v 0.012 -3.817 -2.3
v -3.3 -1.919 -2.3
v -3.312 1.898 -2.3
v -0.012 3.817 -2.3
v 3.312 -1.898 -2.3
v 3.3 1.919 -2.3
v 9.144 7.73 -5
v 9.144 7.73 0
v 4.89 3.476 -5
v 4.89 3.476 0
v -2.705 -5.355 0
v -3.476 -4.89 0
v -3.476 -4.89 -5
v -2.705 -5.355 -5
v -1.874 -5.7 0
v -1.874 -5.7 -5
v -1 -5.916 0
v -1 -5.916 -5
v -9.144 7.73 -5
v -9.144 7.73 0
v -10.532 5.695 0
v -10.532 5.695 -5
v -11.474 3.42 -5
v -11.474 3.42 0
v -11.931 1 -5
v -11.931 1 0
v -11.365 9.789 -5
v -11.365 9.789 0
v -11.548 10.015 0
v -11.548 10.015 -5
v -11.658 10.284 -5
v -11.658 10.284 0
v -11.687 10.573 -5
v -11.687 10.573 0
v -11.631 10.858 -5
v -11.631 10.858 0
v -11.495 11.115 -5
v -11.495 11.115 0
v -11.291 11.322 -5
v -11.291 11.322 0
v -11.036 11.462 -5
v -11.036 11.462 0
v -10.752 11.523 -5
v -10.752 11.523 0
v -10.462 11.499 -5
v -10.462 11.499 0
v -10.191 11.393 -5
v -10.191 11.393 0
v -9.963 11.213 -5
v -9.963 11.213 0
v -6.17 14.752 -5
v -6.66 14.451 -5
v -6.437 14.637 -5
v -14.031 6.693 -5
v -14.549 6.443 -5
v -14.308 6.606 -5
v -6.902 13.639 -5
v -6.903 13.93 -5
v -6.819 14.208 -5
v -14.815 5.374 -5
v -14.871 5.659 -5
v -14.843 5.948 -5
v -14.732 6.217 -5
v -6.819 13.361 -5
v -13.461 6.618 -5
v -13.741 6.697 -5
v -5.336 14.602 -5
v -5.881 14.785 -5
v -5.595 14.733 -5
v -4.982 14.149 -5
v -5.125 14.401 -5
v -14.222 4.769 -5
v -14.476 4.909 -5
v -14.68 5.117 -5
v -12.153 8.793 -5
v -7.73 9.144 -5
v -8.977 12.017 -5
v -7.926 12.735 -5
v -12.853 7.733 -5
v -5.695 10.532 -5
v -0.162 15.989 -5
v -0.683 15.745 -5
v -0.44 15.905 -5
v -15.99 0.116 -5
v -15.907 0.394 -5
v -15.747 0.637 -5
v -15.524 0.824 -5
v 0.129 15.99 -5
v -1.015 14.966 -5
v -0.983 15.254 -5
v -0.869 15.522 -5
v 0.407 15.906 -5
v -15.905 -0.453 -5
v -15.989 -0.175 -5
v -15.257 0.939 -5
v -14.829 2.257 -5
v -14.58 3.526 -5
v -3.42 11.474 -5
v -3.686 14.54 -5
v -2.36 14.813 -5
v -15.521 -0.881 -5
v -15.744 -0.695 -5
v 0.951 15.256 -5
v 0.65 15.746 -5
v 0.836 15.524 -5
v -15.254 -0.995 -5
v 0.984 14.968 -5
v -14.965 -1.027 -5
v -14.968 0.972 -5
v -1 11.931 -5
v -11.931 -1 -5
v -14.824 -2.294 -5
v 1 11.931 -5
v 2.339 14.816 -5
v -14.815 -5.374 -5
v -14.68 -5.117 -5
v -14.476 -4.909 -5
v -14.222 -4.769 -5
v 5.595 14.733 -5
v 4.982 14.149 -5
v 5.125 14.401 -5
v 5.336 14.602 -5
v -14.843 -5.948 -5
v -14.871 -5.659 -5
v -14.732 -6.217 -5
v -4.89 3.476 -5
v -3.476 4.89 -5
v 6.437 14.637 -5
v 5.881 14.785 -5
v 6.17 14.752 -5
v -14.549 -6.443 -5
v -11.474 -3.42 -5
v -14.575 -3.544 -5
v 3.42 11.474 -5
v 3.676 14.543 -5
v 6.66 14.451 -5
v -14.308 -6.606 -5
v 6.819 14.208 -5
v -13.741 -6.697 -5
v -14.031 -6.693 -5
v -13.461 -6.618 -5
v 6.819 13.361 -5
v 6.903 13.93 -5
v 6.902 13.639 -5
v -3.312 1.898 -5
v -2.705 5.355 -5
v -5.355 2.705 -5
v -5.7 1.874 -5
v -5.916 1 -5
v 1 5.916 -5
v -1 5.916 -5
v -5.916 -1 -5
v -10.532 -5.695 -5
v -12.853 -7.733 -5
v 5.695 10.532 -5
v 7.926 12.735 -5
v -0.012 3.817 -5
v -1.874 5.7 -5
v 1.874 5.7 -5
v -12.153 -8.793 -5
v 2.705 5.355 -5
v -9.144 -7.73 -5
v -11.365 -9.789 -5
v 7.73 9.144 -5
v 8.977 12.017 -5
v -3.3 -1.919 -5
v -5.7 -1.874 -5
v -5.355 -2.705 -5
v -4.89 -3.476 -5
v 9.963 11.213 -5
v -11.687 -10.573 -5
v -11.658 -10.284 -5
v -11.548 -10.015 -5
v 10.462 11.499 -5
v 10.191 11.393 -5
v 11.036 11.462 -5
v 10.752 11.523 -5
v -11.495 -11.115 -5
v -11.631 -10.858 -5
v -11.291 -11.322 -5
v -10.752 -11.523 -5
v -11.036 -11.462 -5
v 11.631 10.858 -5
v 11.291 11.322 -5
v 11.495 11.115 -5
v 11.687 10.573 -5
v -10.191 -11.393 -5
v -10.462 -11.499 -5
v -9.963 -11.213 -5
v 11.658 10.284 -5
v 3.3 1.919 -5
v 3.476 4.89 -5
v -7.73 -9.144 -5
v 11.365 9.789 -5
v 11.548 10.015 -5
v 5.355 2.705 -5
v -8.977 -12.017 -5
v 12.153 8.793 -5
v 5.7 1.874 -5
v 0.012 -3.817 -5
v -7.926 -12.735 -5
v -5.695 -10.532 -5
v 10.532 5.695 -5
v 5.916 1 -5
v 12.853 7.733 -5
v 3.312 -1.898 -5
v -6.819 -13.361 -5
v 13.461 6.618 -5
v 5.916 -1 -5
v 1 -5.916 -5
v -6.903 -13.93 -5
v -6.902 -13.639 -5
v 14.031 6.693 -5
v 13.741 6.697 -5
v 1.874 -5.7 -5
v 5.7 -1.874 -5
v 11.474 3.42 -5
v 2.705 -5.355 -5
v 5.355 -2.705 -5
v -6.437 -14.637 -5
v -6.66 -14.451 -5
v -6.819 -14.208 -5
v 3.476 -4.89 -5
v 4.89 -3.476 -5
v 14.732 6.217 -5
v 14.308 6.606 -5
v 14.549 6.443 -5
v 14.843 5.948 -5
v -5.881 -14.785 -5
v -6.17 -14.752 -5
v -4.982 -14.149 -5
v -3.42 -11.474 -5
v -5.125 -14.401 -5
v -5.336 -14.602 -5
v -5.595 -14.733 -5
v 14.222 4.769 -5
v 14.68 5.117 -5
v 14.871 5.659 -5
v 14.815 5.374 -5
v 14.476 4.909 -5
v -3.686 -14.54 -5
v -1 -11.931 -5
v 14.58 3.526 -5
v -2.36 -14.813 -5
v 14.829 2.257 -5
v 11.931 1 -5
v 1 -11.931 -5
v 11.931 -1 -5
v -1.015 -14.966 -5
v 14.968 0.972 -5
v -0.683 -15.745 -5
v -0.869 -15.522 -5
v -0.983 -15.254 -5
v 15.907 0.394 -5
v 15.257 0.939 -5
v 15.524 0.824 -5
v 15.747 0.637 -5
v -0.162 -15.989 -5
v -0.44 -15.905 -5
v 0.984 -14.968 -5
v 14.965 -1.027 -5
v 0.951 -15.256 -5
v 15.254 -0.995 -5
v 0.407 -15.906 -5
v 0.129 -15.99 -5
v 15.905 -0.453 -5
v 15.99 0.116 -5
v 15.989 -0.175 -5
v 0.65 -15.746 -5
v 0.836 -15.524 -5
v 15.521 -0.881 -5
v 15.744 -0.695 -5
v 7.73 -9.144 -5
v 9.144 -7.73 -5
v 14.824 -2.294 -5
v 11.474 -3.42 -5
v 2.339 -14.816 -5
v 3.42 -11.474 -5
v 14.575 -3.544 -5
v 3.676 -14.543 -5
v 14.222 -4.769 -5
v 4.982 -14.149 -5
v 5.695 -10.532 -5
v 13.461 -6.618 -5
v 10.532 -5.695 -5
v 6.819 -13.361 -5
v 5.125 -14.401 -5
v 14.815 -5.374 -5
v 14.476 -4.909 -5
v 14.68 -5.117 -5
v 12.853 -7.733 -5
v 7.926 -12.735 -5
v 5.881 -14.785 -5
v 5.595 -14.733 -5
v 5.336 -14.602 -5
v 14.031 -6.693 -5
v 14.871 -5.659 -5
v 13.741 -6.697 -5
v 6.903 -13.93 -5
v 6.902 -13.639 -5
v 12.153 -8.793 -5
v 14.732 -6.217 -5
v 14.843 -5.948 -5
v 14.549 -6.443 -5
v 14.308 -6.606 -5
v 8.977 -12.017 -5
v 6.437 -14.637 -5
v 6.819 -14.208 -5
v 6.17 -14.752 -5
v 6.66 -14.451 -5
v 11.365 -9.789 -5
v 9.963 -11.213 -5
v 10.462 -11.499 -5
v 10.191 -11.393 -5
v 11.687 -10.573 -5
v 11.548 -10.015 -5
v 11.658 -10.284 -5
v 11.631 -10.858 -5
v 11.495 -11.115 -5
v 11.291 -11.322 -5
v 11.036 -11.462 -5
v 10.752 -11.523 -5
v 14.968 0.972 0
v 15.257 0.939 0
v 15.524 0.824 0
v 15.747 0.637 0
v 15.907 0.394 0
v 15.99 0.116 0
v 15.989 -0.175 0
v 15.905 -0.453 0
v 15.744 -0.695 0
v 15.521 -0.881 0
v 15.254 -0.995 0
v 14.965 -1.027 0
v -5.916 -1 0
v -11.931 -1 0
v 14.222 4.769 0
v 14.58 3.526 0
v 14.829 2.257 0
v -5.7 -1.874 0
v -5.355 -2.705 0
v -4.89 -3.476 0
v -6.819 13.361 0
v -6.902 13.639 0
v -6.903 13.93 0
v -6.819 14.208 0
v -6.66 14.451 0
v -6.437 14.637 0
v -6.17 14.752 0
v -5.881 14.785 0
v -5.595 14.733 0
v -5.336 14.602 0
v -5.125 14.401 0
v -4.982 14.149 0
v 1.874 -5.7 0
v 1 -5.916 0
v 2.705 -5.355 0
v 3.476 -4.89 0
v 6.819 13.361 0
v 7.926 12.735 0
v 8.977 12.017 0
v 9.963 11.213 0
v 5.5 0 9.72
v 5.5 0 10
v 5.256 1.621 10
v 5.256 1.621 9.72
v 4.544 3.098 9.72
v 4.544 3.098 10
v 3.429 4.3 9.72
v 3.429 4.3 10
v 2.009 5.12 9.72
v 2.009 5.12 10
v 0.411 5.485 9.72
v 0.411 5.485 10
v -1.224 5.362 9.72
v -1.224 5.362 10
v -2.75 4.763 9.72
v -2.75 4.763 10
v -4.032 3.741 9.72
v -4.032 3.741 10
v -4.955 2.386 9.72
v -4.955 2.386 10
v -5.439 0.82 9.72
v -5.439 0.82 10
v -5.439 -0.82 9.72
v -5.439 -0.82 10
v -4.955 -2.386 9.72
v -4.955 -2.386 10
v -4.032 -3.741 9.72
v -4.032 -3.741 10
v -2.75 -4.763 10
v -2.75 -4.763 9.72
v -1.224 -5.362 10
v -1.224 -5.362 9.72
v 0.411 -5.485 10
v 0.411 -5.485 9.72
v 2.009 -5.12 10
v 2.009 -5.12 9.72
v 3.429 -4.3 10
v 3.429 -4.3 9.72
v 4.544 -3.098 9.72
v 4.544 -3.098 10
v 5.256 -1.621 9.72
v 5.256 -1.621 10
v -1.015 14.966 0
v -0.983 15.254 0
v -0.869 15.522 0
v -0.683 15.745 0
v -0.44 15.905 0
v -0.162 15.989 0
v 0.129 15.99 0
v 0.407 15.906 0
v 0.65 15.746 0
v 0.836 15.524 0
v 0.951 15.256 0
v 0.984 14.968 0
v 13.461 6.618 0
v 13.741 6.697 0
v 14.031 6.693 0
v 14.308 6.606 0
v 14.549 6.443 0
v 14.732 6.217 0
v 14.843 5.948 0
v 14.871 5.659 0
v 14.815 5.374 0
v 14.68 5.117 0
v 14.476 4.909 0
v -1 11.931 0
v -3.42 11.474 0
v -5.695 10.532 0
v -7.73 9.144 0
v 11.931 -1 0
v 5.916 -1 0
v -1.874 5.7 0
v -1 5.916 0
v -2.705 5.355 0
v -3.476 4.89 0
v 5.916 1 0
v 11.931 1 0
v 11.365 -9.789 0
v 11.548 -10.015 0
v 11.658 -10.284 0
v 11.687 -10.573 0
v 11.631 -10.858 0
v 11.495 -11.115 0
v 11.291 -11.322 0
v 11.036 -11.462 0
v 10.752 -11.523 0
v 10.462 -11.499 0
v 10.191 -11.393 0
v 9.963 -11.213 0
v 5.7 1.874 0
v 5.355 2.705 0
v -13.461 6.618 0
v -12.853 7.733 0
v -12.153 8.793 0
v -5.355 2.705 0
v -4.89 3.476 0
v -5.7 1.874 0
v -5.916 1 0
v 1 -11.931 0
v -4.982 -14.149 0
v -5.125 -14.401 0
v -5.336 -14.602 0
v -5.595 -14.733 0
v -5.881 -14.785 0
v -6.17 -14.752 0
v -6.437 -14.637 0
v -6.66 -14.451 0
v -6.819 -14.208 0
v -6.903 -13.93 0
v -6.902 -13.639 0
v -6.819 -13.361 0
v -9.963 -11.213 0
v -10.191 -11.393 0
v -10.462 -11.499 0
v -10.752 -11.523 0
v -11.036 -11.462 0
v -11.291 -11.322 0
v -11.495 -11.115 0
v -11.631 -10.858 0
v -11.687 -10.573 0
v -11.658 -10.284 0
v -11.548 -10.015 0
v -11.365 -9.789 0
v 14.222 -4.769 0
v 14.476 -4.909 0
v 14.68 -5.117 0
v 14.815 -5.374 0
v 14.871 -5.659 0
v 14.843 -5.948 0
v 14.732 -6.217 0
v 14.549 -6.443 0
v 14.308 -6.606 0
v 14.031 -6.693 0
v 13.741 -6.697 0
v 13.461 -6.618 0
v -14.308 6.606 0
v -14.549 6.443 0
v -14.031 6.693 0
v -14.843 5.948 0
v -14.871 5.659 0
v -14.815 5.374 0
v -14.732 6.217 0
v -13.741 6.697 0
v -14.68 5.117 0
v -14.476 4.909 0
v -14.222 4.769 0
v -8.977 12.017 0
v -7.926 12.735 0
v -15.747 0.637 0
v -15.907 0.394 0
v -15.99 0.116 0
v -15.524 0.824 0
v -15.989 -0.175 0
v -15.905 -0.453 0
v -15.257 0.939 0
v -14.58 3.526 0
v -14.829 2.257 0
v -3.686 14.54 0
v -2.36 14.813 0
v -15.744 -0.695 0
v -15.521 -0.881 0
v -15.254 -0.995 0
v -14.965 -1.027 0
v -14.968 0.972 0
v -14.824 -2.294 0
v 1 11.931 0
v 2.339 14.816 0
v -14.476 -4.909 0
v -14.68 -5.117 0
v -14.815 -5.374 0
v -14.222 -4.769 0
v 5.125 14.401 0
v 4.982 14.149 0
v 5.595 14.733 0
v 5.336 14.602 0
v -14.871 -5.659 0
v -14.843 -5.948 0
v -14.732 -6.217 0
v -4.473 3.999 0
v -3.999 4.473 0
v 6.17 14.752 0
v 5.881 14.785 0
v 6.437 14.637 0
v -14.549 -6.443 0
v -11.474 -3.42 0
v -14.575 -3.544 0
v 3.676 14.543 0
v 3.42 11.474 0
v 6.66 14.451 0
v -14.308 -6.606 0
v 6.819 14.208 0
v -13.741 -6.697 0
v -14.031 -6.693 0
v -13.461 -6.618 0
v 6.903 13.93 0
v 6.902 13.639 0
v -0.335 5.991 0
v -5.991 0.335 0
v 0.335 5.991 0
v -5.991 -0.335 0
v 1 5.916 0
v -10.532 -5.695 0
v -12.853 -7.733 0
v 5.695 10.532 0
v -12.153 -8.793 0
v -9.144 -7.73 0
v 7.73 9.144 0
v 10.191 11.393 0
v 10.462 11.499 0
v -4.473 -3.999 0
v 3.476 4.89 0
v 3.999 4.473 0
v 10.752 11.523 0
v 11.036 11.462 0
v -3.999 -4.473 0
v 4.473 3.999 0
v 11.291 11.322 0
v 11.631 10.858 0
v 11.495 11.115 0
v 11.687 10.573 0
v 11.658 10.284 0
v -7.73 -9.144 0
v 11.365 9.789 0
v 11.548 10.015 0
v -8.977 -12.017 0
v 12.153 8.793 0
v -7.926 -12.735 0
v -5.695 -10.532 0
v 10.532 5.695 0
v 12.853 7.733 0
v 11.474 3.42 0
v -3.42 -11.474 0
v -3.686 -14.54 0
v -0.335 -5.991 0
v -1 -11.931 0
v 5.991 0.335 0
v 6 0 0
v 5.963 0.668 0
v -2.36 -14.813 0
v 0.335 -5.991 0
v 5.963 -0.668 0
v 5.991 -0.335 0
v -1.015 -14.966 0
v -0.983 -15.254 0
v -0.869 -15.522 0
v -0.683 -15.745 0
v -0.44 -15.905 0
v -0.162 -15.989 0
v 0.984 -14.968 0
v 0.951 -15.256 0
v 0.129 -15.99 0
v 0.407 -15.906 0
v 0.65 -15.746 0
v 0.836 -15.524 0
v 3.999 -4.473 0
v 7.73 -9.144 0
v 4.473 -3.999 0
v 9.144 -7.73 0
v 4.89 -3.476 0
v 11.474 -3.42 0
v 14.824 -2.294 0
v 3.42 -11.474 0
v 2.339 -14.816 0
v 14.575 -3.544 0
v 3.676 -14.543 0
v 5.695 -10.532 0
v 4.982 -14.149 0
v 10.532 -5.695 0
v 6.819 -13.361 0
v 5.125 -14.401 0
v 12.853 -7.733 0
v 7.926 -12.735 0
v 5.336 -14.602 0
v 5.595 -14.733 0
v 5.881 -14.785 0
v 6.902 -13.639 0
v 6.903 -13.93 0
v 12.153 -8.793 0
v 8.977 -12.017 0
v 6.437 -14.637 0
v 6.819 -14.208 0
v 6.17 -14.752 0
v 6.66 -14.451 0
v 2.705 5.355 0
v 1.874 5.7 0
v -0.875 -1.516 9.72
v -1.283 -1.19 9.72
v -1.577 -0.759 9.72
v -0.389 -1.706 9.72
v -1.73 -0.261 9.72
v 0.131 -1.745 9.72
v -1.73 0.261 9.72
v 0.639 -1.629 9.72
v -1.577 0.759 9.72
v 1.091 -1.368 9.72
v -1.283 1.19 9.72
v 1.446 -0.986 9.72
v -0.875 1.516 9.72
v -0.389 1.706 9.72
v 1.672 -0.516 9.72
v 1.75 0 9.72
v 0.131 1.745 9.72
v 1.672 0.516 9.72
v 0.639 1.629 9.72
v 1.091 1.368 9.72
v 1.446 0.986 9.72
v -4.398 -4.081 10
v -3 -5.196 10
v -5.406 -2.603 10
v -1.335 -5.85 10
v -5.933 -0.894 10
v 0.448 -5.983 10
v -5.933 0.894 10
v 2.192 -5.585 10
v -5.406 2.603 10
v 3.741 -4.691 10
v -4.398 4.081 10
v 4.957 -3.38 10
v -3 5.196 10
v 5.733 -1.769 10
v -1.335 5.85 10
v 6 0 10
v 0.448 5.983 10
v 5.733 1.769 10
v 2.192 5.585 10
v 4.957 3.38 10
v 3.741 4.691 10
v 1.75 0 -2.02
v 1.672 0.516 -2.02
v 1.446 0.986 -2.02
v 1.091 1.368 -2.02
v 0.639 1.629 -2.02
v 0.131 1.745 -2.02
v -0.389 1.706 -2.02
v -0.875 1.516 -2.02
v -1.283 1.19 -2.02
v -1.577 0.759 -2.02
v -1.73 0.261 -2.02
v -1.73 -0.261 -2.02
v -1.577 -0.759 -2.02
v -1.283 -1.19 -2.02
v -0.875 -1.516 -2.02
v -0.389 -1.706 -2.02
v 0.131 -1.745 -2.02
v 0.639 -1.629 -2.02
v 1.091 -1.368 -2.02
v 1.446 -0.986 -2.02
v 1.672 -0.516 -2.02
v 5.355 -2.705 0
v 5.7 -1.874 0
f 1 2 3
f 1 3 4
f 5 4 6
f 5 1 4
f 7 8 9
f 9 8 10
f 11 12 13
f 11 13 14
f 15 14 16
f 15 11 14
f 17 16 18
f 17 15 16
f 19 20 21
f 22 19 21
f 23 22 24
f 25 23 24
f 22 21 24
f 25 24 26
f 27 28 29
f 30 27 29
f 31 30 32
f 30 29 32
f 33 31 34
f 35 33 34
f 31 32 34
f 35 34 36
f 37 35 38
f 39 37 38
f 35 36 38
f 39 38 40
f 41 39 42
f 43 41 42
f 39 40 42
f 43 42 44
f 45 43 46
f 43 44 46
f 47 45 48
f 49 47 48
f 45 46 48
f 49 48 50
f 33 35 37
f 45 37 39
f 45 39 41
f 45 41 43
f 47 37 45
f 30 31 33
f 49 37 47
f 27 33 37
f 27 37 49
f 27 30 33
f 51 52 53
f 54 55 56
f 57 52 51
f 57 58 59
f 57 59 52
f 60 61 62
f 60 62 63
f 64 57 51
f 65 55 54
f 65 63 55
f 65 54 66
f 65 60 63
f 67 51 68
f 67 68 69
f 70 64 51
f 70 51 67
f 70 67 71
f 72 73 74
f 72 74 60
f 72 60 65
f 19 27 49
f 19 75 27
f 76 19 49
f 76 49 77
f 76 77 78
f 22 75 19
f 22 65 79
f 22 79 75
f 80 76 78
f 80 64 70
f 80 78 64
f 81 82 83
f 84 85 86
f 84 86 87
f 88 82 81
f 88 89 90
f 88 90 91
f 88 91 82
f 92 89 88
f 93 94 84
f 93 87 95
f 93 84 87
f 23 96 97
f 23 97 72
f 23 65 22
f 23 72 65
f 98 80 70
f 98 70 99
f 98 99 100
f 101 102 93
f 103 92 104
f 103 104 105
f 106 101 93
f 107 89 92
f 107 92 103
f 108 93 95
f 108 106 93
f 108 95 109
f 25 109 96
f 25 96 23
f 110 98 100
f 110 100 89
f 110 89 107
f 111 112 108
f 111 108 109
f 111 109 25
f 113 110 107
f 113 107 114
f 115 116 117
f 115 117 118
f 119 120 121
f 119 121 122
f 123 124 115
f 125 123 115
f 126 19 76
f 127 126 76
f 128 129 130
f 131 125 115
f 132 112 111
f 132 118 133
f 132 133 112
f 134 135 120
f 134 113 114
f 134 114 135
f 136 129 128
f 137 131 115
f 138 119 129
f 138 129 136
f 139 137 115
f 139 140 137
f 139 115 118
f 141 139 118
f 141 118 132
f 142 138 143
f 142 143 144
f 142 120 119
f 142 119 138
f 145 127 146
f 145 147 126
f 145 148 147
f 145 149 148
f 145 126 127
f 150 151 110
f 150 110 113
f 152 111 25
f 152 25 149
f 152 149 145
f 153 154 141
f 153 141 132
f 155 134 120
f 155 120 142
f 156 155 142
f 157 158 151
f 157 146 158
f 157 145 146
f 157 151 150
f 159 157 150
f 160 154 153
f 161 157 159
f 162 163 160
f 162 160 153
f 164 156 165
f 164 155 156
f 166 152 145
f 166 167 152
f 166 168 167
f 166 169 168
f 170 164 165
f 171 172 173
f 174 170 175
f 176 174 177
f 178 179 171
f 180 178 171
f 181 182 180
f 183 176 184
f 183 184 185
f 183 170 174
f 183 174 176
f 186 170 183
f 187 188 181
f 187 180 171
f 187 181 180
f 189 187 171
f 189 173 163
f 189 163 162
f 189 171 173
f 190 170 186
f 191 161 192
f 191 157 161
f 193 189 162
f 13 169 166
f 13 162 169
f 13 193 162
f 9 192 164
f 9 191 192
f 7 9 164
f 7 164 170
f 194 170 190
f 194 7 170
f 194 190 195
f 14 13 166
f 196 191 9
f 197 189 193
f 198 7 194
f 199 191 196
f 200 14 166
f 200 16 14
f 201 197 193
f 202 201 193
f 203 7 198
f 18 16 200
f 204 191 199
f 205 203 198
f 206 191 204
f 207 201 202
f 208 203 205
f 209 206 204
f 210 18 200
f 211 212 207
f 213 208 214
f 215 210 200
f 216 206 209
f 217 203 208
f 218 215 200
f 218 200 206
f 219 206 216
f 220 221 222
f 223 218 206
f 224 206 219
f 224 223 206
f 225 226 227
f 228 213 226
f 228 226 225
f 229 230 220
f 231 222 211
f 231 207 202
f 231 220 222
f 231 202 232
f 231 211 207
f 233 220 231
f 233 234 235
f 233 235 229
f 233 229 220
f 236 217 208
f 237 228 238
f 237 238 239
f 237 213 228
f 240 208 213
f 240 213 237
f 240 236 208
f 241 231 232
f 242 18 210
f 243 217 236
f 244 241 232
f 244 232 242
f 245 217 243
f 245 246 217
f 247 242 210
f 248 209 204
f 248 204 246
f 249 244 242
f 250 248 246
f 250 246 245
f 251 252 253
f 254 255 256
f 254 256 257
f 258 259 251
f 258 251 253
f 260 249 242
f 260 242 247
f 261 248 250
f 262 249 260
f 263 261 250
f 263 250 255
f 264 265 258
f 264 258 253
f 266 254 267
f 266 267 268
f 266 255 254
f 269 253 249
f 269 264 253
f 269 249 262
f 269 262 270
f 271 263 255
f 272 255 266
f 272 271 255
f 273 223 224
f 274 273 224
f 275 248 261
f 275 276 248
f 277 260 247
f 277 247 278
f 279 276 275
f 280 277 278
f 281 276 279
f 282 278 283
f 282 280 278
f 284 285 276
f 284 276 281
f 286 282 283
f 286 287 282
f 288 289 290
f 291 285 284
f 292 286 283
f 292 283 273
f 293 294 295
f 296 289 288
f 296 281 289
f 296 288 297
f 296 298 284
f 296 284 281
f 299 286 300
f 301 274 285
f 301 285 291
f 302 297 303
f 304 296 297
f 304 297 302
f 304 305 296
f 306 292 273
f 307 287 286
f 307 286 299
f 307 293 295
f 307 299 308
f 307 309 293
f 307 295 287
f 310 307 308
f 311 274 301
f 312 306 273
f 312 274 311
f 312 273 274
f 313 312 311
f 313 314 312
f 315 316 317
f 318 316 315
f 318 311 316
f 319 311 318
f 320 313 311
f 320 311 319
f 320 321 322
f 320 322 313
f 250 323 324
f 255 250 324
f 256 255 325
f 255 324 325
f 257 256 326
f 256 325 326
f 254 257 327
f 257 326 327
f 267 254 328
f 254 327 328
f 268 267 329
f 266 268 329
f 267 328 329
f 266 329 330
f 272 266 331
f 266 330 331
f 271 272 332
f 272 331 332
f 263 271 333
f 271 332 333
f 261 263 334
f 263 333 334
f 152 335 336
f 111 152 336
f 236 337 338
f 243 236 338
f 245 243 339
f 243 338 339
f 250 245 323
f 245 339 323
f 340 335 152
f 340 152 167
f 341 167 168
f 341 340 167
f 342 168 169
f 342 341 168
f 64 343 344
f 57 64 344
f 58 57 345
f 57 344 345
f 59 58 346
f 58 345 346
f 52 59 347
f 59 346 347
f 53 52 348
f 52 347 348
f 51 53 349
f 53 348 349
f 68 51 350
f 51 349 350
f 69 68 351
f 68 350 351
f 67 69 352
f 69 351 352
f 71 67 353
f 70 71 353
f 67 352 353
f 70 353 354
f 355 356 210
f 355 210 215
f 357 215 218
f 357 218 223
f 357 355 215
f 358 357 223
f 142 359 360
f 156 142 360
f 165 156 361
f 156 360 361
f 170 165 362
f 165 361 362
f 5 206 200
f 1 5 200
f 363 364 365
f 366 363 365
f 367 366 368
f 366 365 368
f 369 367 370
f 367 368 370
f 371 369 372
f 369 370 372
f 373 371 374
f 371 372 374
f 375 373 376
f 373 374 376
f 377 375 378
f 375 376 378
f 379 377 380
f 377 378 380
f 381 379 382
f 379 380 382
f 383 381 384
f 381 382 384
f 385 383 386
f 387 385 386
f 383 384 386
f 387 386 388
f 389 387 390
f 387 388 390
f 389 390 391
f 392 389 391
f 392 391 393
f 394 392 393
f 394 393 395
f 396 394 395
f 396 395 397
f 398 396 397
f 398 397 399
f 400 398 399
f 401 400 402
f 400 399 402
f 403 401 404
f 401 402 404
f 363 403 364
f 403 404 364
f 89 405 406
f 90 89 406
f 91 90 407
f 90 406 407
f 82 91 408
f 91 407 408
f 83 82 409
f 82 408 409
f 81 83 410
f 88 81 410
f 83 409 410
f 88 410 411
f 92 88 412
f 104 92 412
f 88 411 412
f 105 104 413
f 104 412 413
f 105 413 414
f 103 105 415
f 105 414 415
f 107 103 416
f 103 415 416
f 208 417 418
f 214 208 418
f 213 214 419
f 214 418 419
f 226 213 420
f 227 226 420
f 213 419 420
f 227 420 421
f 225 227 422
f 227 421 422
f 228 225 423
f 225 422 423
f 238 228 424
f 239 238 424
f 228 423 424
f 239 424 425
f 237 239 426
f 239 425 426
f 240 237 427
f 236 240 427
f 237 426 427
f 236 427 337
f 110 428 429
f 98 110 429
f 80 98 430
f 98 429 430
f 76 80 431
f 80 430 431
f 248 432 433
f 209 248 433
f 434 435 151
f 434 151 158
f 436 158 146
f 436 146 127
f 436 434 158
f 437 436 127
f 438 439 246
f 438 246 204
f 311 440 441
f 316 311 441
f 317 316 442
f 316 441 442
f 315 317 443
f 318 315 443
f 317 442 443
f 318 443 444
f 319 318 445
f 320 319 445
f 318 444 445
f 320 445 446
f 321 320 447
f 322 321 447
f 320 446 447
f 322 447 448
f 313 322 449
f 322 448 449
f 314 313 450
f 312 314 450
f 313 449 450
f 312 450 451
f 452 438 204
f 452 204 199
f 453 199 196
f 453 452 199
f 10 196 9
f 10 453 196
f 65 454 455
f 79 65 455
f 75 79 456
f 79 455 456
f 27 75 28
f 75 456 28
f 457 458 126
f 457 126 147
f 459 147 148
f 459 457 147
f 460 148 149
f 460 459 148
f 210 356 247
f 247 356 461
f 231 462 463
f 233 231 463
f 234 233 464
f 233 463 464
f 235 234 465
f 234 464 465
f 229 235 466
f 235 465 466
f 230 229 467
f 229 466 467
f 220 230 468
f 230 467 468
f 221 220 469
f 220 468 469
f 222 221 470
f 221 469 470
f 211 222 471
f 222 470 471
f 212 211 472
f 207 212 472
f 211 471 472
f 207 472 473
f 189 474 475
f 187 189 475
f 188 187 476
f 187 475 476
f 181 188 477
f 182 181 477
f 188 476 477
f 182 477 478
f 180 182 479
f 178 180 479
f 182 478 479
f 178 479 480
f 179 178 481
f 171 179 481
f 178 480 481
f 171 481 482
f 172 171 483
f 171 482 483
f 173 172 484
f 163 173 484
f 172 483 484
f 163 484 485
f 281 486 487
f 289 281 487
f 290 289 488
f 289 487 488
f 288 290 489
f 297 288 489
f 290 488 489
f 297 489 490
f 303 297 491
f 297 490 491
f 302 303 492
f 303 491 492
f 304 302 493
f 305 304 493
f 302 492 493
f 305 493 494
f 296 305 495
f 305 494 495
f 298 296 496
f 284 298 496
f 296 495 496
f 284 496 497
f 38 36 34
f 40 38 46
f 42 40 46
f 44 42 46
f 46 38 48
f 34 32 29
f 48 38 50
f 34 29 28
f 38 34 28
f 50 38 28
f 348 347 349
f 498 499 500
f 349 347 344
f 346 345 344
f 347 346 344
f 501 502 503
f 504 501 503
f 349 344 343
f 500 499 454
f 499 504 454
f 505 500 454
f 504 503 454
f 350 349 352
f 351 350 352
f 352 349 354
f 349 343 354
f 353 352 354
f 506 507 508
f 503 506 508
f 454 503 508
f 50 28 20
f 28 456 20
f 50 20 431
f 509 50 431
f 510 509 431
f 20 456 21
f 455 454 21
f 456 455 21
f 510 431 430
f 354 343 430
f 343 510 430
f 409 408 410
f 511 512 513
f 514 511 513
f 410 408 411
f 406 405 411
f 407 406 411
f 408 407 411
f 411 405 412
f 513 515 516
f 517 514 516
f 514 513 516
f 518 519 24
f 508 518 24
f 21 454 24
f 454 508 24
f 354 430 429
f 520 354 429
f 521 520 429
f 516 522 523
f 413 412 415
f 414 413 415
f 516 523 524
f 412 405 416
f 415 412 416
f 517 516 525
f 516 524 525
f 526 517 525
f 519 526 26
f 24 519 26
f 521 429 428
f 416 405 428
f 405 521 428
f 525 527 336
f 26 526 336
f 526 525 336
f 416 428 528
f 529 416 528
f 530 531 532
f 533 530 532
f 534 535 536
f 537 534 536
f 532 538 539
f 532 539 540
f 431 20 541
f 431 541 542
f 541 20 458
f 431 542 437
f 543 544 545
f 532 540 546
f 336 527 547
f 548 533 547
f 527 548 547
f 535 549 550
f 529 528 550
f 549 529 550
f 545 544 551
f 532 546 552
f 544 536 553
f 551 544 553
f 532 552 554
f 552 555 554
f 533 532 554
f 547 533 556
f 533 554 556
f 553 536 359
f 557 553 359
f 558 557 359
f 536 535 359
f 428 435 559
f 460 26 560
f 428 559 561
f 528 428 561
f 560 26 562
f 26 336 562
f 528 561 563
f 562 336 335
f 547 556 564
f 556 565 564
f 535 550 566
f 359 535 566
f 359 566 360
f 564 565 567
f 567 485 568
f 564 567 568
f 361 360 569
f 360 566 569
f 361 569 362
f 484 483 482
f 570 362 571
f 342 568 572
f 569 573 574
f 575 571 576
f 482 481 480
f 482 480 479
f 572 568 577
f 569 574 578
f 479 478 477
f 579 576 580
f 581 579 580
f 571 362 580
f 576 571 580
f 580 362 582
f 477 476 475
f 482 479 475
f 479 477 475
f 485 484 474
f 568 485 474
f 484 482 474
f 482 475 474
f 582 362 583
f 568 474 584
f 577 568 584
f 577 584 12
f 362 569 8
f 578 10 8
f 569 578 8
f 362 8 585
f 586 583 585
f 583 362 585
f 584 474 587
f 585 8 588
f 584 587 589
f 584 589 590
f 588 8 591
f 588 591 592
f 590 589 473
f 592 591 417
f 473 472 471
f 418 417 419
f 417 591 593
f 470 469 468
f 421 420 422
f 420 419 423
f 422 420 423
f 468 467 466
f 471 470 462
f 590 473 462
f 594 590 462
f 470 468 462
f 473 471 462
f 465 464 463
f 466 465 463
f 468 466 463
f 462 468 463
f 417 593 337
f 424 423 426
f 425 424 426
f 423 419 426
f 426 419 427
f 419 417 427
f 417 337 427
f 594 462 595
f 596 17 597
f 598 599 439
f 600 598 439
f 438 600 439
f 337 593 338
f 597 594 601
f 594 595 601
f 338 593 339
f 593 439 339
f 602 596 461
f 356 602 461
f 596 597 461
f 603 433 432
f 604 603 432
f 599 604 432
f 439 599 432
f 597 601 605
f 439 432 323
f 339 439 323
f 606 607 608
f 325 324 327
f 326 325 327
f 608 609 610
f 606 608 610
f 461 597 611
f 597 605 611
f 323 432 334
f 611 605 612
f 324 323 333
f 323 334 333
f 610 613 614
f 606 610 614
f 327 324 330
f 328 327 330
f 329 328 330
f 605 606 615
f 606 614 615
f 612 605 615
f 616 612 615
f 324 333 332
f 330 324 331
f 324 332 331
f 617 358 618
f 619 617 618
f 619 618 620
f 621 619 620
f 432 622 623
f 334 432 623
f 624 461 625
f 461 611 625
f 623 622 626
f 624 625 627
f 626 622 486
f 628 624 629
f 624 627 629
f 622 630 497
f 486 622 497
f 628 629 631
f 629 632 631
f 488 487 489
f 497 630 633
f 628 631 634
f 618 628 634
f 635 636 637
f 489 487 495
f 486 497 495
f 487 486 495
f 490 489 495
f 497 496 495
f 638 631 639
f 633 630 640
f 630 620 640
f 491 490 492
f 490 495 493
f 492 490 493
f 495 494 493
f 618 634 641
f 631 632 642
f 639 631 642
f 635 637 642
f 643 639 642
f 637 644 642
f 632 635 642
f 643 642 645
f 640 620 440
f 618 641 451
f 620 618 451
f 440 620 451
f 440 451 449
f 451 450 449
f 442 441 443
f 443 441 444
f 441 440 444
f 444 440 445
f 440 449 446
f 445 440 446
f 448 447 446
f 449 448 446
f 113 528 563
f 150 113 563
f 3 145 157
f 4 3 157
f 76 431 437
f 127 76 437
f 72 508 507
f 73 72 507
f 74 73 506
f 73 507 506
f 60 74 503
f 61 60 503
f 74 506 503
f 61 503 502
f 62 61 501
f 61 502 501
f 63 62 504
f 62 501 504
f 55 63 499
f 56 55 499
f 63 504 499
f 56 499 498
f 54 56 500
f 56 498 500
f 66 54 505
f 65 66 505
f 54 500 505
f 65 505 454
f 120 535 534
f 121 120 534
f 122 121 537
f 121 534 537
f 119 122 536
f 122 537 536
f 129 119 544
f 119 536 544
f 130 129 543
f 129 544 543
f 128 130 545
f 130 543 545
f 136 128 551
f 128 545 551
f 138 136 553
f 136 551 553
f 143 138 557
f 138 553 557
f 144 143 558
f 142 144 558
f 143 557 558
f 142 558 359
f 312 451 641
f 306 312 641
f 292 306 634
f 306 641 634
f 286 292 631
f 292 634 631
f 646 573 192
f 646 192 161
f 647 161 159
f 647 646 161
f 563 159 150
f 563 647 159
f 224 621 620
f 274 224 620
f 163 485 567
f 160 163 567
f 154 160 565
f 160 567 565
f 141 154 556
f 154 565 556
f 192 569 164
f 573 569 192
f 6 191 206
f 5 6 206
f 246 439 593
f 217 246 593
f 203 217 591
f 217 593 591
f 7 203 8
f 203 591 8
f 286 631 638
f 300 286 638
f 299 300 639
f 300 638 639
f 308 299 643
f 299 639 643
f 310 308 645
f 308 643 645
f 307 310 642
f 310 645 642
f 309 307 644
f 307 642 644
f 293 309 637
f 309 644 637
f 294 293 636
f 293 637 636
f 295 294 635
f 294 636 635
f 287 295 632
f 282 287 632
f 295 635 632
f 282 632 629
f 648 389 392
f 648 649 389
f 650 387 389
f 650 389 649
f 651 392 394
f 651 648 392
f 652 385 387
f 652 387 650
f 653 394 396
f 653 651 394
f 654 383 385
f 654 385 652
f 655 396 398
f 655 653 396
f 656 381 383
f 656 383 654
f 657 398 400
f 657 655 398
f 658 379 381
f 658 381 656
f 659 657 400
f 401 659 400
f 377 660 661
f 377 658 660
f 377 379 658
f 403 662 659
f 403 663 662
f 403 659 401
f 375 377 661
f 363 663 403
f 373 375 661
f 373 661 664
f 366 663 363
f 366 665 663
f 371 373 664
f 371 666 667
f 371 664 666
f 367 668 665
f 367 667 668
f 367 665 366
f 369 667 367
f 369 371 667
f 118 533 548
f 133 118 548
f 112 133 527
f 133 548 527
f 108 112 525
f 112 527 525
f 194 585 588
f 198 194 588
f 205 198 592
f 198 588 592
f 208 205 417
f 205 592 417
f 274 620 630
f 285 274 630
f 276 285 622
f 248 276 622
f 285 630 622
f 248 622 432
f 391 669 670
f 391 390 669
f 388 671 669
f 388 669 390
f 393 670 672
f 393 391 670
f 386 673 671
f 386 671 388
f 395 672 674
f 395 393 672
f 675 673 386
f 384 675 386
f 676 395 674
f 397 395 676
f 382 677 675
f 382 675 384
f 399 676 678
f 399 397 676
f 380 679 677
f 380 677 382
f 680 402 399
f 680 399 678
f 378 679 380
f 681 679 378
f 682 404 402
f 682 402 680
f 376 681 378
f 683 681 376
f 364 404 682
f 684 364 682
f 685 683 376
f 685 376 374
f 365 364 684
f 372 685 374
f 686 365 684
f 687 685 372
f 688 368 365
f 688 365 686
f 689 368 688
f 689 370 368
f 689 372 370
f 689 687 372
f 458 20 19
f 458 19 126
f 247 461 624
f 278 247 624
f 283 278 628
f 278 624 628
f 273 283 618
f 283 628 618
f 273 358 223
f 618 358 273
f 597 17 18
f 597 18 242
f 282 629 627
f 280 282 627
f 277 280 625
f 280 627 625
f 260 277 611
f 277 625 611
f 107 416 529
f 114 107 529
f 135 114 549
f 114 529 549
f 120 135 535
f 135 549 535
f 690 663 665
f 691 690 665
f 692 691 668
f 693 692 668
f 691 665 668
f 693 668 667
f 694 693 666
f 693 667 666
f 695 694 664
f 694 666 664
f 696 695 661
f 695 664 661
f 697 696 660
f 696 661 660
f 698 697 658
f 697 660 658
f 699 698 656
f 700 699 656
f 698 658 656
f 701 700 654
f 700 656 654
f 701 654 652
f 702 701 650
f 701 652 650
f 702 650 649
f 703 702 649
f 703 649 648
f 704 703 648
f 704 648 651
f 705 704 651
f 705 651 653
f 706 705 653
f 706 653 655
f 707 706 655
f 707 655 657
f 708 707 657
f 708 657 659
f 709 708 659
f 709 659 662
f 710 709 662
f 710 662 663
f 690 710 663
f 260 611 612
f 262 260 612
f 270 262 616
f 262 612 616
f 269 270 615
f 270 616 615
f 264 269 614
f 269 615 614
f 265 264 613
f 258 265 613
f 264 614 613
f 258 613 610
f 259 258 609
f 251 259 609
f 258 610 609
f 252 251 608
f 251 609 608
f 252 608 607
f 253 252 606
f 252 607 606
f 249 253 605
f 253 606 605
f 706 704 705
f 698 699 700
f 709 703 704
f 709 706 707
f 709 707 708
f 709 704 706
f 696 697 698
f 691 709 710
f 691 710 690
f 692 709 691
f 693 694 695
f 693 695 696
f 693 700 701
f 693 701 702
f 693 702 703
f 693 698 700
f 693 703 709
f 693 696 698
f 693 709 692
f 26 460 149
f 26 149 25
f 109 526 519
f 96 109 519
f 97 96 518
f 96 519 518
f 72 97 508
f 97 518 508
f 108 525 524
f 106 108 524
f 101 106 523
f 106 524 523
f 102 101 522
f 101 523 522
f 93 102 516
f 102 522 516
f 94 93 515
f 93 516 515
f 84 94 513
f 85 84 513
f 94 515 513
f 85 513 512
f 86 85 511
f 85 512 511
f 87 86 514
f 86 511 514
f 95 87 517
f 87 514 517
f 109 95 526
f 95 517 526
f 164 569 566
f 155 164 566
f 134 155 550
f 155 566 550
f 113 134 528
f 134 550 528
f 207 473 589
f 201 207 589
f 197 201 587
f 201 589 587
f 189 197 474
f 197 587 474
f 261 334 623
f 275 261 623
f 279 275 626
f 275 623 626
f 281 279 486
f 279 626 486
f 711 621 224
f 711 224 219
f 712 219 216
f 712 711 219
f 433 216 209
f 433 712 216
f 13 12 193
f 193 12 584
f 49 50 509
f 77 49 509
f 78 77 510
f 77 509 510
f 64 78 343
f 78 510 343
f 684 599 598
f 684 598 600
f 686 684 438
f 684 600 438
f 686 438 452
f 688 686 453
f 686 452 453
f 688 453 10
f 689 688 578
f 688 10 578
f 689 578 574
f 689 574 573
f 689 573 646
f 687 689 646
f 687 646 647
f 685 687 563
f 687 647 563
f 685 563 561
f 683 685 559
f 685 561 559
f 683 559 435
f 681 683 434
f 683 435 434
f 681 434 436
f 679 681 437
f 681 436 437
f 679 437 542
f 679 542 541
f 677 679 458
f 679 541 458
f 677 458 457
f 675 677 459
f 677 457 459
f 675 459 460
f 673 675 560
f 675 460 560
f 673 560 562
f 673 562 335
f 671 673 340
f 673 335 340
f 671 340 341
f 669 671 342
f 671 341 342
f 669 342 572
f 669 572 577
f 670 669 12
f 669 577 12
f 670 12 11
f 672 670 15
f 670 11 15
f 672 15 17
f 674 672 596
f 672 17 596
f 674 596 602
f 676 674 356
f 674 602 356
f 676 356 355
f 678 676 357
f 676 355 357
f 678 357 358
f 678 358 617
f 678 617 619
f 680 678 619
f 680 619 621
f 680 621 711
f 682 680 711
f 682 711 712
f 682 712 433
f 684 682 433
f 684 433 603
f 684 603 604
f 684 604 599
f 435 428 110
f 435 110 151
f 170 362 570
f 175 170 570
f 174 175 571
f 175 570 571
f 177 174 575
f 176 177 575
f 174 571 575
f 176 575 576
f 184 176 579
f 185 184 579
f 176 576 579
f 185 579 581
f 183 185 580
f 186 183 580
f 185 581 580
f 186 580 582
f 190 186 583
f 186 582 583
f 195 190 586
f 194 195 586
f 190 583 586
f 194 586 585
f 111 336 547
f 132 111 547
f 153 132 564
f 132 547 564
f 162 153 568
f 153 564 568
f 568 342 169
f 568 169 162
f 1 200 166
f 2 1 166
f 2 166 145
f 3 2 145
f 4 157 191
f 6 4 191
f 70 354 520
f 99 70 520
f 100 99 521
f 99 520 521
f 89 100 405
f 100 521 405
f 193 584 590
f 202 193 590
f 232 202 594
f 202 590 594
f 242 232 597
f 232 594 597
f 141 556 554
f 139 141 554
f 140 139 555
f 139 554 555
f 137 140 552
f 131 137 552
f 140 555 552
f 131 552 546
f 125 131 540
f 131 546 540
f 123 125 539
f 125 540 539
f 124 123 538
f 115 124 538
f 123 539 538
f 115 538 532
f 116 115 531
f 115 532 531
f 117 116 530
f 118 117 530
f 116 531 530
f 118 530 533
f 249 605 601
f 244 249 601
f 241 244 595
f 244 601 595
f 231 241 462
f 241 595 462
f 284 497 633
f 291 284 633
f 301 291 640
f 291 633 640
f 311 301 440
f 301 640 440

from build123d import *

# Parameters (mm, degrees)
PAD_DEPTH       = 5
POCKET_DEPTH    = 5
POCKET001_DEPTH = 2.7
SKETCH001_R     = 6
PAD001_DEPTH    = 10
SKETCH003_R     = 1.75
POCKET002_DEPTH = 15.001
SKETCH_R        = 5.5
POCKET003_DEPTH = 0.28
SKETCH008_R     = 3.108339
PAD002_DEPTH    = 0.28


with BuildPart() as part:
    # Sketch002 → Pad (new body)
    with BuildSketch(Plane(origin=(0, 0, 0), x_dir=(1, 0, 0), z_dir=(0, 0, -1))):
        with BuildLine():
            ThreePointArc((-6.818582, 13.360649), (-8.459114, 12.387227), (-9.962838, 11.213468))
            ThreePointArc((-9.962838, 11.213468), (-11.40037, 11.226378), (-11.365355, 9.789214))
            ThreePointArc((-11.365355, 9.789214), (-12.514173, 8.270155), (-13.461245, 6.617771))
            ThreePointArc((-13.461245, 6.617771), (-14.797088, 6.086557), (-14.221642, 4.769163))
            ThreePointArc((-14.221642, 4.769163), (-14.712665, 2.9219), (-14.964788, 1.027192))
            ThreePointArc((-14.964788, 1.027192), (-15.999972, 0.029665), (-14.968494, -0.971693))
            ThreePointArc((-14.968494, -0.971693), (-14.718057, -2.894616), (-14.221642, -4.769163))
            ThreePointArc((-14.221642, -4.769163), (-14.797088, -6.086557), (-13.461245, -6.617771))
            ThreePointArc((-13.461245, -6.617771), (-12.514173, -8.270155), (-11.365355, -9.789214))
            ThreePointArc((-11.365355, -9.789214), (-11.40037, -11.226378), (-9.962838, -11.213468))
            ThreePointArc((-9.962838, -11.213468), (-8.459114, -12.387227), (-6.818582, -13.360649))
            ThreePointArc((-6.818582, -13.360649), (-6.307429, -14.704296), (-4.981567, -14.148639))
            ThreePointArc((-4.981567, -14.148639), (-3.026004, -14.691606), (-1.015045, -14.965617))
            ThreePointArc((-1.015045, -14.965617), (-0.016678, -15.999991), (0.983842, -14.9677))
            ThreePointArc((0.983842, -14.9677), (3.010688, -14.694753), (4.981567, -14.148639))
            ThreePointArc((4.981567, -14.148639), (6.307429, -14.704296), (6.818582, -13.360649))
            ThreePointArc((6.818582, -13.360649), (8.459114, -12.387227), (9.962838, -11.213468))
            ThreePointArc((9.962838, -11.213468), (11.40037, -11.226378), (11.365355, -9.789214))
            ThreePointArc((11.365355, -9.789214), (12.514173, -8.270155), (13.461245, -6.617771))
            ThreePointArc((13.461245, -6.617771), (14.797088, -6.086557), (14.221642, -4.769163))
            ThreePointArc((14.221642, -4.769163), (14.718057, -2.894616), (14.968494, -0.971693))
            ThreePointArc((14.968494, -0.971693), (15.999972, 0.029665), (14.964788, 1.027192))
            ThreePointArc((14.964788, 1.027192), (14.712665, 2.9219), (14.221642, 4.769163))
            ThreePointArc((14.221642, 4.769163), (14.797088, 6.086557), (13.461245, 6.617771))
            ThreePointArc((13.461245, 6.617771), (12.514173, 8.270155), (11.365355, 9.789214))
            ThreePointArc((11.365355, 9.789214), (11.40037, 11.226378), (9.962838, 11.213468))
            ThreePointArc((9.962838, 11.213468), (8.459114, 12.387227), (6.818582, 13.360649))
            ThreePointArc((6.818582, 13.360649), (6.307429, 14.704296), (4.981567, 14.148639))
            ThreePointArc((4.981567, 14.148639), (3.010688, 14.694753), (0.983842, 14.9677))
            ThreePointArc((0.983842, 14.9677), (-0.016678, 15.999991), (-1.015045, 14.965617))
            ThreePointArc((-1.015045, 14.965617), (-3.026004, 14.691606), (-4.981567, 14.148639))
            ThreePointArc((-4.981567, 14.148639), (-6.307429, 14.704296), (-6.818582, 13.360649))
        make_face()
    extrude(amount=PAD_DEPTH)

    # Sketch006 → Pocket (cut)
    with BuildSketch(Plane.XY):
        with BuildLine():
            ThreePointArc((-9.143797, 7.729592), (-11.061719, 4.581917), (-11.931287, 1))
            Line((-5.91608, 1), (-11.931287, 1))
            ThreePointArc((-4.890405, 3.476196), (-5.543277, 2.296102), (-5.91608, 1))
            Line((-9.143797, 7.729592), (-4.890405, 3.476196))
        make_face()
        with BuildLine():
            ThreePointArc((-11.931287, -1), (-11.061721, -4.581914), (-9.143802, -7.729585))
            Line((-4.890408, -3.476192), (-9.143802, -7.729585))
            ThreePointArc((-5.91608, -1), (-5.543277, -2.2961), (-4.890408, -3.476192))
            Line((-5.91608, -1), (-11.931287, -1))
        make_face()
        with BuildLine():
            ThreePointArc((-1, 11.931287), (-4.581912, 11.061722), (-7.729583, 9.143804))
            Line((-7.729583, 9.143804), (-3.476191, 4.890408))
            ThreePointArc((-1, 5.91608), (-2.296099, 5.543278), (-3.476191, 4.890408))
            Line((-1, 11.931287), (-1, 5.91608))
        make_face()
        with BuildLine():
            ThreePointArc((7.729588, 9.143799), (4.581915, 11.06172), (1, 11.931287))
            Line((1, 11.931287), (1, 5.91608))
            ThreePointArc((3.476194, 4.890406), (2.296101, 5.543277), (1, 5.91608))
            Line((7.729588, 9.143799), (3.476194, 4.890406))
        make_face()
        with BuildLine():
            ThreePointArc((9.143797, -7.729592), (11.061719, -4.581917), (11.931287, -1))
            Line((11.931287, -1), (5.91608, -1))
            ThreePointArc((4.890405, -3.476196), (5.543277, -2.296102), (5.91608, -1))
            Line((4.890405, -3.476196), (9.143797, -7.729592))
        make_face()
        with BuildLine():
            ThreePointArc((1, -11.931287), (4.581912, -11.061722), (7.729583, -9.143804))
            Line((3.476191, -4.890408), (7.729583, -9.143804))
            ThreePointArc((1, -5.91608), (2.296099, -5.543278), (3.476191, -4.890408))
            Line((1, -5.91608), (1, -11.931287))
        make_face()
        with BuildLine():
            ThreePointArc((-7.729589, -9.143799), (-4.581916, -11.06172), (-1, -11.931287))
            Line((-1, -5.91608), (-1, -11.931287))
            ThreePointArc((-3.476194, -4.890406), (-2.296101, -5.543277), (-1, -5.91608))
            Line((-3.476194, -4.890406), (-7.729589, -9.143799))
        make_face()
        with BuildLine():
            ThreePointArc((11.931287, 1), (11.061721, 4.581914), (9.143802, 7.729586))
            Line((9.143802, 7.729586), (4.890407, 3.476193))
            ThreePointArc((5.91608, 1), (5.543277, 2.2961), (4.890407, 3.476193))
            Line((11.931287, 1), (5.91608, 1))
        make_face()
    extrude(amount=-POCKET_DEPTH, mode=Mode.SUBTRACT)

    # Sketch007 (on Face34 of Pad) → Pocket001 (cut)
    with BuildSketch(Plane(origin=(0, 0, -5), x_dir=(1, 0, 0), z_dir=(0, 0, -1))):
        Polygon((3.3, -1.918967), (3.311874, 1.8984), (0.011874, 3.817367), (-3.3, 1.918967), (-3.311874, -1.8984), (-0.011874, -3.817367), align=None)
    extrude(amount=-POCKET001_DEPTH, mode=Mode.SUBTRACT)

    # Sketch001 (on Face33 of Pad) → Pad001 (join)
    with BuildSketch(Plane.XY):
        Circle(SKETCH001_R)
    extrude(amount=PAD001_DEPTH)

    # Sketch003 (on Face74 of Pad001) → Pocket002 (cut, through all)
    with BuildSketch(Plane.XY.offset(10)):
        Circle(SKETCH003_R)
    extrude(amount=-POCKET002_DEPTH, mode=Mode.SUBTRACT)

    # Sketch (on Face74 of Pocket002) → Pocket003 (cut)
    with BuildSketch(Plane.XY.offset(10)):
        Circle(SKETCH_R)
    extrude(amount=-POCKET003_DEPTH, mode=Mode.SUBTRACT)

    # Sketch008 (on Face4 of Pocket003) → Pad002 (join)
    with BuildSketch(Plane.XY.offset(-2.3)):
        Circle(SKETCH008_R)
    extrude(amount=PAD002_DEPTH)


solid = part.part
